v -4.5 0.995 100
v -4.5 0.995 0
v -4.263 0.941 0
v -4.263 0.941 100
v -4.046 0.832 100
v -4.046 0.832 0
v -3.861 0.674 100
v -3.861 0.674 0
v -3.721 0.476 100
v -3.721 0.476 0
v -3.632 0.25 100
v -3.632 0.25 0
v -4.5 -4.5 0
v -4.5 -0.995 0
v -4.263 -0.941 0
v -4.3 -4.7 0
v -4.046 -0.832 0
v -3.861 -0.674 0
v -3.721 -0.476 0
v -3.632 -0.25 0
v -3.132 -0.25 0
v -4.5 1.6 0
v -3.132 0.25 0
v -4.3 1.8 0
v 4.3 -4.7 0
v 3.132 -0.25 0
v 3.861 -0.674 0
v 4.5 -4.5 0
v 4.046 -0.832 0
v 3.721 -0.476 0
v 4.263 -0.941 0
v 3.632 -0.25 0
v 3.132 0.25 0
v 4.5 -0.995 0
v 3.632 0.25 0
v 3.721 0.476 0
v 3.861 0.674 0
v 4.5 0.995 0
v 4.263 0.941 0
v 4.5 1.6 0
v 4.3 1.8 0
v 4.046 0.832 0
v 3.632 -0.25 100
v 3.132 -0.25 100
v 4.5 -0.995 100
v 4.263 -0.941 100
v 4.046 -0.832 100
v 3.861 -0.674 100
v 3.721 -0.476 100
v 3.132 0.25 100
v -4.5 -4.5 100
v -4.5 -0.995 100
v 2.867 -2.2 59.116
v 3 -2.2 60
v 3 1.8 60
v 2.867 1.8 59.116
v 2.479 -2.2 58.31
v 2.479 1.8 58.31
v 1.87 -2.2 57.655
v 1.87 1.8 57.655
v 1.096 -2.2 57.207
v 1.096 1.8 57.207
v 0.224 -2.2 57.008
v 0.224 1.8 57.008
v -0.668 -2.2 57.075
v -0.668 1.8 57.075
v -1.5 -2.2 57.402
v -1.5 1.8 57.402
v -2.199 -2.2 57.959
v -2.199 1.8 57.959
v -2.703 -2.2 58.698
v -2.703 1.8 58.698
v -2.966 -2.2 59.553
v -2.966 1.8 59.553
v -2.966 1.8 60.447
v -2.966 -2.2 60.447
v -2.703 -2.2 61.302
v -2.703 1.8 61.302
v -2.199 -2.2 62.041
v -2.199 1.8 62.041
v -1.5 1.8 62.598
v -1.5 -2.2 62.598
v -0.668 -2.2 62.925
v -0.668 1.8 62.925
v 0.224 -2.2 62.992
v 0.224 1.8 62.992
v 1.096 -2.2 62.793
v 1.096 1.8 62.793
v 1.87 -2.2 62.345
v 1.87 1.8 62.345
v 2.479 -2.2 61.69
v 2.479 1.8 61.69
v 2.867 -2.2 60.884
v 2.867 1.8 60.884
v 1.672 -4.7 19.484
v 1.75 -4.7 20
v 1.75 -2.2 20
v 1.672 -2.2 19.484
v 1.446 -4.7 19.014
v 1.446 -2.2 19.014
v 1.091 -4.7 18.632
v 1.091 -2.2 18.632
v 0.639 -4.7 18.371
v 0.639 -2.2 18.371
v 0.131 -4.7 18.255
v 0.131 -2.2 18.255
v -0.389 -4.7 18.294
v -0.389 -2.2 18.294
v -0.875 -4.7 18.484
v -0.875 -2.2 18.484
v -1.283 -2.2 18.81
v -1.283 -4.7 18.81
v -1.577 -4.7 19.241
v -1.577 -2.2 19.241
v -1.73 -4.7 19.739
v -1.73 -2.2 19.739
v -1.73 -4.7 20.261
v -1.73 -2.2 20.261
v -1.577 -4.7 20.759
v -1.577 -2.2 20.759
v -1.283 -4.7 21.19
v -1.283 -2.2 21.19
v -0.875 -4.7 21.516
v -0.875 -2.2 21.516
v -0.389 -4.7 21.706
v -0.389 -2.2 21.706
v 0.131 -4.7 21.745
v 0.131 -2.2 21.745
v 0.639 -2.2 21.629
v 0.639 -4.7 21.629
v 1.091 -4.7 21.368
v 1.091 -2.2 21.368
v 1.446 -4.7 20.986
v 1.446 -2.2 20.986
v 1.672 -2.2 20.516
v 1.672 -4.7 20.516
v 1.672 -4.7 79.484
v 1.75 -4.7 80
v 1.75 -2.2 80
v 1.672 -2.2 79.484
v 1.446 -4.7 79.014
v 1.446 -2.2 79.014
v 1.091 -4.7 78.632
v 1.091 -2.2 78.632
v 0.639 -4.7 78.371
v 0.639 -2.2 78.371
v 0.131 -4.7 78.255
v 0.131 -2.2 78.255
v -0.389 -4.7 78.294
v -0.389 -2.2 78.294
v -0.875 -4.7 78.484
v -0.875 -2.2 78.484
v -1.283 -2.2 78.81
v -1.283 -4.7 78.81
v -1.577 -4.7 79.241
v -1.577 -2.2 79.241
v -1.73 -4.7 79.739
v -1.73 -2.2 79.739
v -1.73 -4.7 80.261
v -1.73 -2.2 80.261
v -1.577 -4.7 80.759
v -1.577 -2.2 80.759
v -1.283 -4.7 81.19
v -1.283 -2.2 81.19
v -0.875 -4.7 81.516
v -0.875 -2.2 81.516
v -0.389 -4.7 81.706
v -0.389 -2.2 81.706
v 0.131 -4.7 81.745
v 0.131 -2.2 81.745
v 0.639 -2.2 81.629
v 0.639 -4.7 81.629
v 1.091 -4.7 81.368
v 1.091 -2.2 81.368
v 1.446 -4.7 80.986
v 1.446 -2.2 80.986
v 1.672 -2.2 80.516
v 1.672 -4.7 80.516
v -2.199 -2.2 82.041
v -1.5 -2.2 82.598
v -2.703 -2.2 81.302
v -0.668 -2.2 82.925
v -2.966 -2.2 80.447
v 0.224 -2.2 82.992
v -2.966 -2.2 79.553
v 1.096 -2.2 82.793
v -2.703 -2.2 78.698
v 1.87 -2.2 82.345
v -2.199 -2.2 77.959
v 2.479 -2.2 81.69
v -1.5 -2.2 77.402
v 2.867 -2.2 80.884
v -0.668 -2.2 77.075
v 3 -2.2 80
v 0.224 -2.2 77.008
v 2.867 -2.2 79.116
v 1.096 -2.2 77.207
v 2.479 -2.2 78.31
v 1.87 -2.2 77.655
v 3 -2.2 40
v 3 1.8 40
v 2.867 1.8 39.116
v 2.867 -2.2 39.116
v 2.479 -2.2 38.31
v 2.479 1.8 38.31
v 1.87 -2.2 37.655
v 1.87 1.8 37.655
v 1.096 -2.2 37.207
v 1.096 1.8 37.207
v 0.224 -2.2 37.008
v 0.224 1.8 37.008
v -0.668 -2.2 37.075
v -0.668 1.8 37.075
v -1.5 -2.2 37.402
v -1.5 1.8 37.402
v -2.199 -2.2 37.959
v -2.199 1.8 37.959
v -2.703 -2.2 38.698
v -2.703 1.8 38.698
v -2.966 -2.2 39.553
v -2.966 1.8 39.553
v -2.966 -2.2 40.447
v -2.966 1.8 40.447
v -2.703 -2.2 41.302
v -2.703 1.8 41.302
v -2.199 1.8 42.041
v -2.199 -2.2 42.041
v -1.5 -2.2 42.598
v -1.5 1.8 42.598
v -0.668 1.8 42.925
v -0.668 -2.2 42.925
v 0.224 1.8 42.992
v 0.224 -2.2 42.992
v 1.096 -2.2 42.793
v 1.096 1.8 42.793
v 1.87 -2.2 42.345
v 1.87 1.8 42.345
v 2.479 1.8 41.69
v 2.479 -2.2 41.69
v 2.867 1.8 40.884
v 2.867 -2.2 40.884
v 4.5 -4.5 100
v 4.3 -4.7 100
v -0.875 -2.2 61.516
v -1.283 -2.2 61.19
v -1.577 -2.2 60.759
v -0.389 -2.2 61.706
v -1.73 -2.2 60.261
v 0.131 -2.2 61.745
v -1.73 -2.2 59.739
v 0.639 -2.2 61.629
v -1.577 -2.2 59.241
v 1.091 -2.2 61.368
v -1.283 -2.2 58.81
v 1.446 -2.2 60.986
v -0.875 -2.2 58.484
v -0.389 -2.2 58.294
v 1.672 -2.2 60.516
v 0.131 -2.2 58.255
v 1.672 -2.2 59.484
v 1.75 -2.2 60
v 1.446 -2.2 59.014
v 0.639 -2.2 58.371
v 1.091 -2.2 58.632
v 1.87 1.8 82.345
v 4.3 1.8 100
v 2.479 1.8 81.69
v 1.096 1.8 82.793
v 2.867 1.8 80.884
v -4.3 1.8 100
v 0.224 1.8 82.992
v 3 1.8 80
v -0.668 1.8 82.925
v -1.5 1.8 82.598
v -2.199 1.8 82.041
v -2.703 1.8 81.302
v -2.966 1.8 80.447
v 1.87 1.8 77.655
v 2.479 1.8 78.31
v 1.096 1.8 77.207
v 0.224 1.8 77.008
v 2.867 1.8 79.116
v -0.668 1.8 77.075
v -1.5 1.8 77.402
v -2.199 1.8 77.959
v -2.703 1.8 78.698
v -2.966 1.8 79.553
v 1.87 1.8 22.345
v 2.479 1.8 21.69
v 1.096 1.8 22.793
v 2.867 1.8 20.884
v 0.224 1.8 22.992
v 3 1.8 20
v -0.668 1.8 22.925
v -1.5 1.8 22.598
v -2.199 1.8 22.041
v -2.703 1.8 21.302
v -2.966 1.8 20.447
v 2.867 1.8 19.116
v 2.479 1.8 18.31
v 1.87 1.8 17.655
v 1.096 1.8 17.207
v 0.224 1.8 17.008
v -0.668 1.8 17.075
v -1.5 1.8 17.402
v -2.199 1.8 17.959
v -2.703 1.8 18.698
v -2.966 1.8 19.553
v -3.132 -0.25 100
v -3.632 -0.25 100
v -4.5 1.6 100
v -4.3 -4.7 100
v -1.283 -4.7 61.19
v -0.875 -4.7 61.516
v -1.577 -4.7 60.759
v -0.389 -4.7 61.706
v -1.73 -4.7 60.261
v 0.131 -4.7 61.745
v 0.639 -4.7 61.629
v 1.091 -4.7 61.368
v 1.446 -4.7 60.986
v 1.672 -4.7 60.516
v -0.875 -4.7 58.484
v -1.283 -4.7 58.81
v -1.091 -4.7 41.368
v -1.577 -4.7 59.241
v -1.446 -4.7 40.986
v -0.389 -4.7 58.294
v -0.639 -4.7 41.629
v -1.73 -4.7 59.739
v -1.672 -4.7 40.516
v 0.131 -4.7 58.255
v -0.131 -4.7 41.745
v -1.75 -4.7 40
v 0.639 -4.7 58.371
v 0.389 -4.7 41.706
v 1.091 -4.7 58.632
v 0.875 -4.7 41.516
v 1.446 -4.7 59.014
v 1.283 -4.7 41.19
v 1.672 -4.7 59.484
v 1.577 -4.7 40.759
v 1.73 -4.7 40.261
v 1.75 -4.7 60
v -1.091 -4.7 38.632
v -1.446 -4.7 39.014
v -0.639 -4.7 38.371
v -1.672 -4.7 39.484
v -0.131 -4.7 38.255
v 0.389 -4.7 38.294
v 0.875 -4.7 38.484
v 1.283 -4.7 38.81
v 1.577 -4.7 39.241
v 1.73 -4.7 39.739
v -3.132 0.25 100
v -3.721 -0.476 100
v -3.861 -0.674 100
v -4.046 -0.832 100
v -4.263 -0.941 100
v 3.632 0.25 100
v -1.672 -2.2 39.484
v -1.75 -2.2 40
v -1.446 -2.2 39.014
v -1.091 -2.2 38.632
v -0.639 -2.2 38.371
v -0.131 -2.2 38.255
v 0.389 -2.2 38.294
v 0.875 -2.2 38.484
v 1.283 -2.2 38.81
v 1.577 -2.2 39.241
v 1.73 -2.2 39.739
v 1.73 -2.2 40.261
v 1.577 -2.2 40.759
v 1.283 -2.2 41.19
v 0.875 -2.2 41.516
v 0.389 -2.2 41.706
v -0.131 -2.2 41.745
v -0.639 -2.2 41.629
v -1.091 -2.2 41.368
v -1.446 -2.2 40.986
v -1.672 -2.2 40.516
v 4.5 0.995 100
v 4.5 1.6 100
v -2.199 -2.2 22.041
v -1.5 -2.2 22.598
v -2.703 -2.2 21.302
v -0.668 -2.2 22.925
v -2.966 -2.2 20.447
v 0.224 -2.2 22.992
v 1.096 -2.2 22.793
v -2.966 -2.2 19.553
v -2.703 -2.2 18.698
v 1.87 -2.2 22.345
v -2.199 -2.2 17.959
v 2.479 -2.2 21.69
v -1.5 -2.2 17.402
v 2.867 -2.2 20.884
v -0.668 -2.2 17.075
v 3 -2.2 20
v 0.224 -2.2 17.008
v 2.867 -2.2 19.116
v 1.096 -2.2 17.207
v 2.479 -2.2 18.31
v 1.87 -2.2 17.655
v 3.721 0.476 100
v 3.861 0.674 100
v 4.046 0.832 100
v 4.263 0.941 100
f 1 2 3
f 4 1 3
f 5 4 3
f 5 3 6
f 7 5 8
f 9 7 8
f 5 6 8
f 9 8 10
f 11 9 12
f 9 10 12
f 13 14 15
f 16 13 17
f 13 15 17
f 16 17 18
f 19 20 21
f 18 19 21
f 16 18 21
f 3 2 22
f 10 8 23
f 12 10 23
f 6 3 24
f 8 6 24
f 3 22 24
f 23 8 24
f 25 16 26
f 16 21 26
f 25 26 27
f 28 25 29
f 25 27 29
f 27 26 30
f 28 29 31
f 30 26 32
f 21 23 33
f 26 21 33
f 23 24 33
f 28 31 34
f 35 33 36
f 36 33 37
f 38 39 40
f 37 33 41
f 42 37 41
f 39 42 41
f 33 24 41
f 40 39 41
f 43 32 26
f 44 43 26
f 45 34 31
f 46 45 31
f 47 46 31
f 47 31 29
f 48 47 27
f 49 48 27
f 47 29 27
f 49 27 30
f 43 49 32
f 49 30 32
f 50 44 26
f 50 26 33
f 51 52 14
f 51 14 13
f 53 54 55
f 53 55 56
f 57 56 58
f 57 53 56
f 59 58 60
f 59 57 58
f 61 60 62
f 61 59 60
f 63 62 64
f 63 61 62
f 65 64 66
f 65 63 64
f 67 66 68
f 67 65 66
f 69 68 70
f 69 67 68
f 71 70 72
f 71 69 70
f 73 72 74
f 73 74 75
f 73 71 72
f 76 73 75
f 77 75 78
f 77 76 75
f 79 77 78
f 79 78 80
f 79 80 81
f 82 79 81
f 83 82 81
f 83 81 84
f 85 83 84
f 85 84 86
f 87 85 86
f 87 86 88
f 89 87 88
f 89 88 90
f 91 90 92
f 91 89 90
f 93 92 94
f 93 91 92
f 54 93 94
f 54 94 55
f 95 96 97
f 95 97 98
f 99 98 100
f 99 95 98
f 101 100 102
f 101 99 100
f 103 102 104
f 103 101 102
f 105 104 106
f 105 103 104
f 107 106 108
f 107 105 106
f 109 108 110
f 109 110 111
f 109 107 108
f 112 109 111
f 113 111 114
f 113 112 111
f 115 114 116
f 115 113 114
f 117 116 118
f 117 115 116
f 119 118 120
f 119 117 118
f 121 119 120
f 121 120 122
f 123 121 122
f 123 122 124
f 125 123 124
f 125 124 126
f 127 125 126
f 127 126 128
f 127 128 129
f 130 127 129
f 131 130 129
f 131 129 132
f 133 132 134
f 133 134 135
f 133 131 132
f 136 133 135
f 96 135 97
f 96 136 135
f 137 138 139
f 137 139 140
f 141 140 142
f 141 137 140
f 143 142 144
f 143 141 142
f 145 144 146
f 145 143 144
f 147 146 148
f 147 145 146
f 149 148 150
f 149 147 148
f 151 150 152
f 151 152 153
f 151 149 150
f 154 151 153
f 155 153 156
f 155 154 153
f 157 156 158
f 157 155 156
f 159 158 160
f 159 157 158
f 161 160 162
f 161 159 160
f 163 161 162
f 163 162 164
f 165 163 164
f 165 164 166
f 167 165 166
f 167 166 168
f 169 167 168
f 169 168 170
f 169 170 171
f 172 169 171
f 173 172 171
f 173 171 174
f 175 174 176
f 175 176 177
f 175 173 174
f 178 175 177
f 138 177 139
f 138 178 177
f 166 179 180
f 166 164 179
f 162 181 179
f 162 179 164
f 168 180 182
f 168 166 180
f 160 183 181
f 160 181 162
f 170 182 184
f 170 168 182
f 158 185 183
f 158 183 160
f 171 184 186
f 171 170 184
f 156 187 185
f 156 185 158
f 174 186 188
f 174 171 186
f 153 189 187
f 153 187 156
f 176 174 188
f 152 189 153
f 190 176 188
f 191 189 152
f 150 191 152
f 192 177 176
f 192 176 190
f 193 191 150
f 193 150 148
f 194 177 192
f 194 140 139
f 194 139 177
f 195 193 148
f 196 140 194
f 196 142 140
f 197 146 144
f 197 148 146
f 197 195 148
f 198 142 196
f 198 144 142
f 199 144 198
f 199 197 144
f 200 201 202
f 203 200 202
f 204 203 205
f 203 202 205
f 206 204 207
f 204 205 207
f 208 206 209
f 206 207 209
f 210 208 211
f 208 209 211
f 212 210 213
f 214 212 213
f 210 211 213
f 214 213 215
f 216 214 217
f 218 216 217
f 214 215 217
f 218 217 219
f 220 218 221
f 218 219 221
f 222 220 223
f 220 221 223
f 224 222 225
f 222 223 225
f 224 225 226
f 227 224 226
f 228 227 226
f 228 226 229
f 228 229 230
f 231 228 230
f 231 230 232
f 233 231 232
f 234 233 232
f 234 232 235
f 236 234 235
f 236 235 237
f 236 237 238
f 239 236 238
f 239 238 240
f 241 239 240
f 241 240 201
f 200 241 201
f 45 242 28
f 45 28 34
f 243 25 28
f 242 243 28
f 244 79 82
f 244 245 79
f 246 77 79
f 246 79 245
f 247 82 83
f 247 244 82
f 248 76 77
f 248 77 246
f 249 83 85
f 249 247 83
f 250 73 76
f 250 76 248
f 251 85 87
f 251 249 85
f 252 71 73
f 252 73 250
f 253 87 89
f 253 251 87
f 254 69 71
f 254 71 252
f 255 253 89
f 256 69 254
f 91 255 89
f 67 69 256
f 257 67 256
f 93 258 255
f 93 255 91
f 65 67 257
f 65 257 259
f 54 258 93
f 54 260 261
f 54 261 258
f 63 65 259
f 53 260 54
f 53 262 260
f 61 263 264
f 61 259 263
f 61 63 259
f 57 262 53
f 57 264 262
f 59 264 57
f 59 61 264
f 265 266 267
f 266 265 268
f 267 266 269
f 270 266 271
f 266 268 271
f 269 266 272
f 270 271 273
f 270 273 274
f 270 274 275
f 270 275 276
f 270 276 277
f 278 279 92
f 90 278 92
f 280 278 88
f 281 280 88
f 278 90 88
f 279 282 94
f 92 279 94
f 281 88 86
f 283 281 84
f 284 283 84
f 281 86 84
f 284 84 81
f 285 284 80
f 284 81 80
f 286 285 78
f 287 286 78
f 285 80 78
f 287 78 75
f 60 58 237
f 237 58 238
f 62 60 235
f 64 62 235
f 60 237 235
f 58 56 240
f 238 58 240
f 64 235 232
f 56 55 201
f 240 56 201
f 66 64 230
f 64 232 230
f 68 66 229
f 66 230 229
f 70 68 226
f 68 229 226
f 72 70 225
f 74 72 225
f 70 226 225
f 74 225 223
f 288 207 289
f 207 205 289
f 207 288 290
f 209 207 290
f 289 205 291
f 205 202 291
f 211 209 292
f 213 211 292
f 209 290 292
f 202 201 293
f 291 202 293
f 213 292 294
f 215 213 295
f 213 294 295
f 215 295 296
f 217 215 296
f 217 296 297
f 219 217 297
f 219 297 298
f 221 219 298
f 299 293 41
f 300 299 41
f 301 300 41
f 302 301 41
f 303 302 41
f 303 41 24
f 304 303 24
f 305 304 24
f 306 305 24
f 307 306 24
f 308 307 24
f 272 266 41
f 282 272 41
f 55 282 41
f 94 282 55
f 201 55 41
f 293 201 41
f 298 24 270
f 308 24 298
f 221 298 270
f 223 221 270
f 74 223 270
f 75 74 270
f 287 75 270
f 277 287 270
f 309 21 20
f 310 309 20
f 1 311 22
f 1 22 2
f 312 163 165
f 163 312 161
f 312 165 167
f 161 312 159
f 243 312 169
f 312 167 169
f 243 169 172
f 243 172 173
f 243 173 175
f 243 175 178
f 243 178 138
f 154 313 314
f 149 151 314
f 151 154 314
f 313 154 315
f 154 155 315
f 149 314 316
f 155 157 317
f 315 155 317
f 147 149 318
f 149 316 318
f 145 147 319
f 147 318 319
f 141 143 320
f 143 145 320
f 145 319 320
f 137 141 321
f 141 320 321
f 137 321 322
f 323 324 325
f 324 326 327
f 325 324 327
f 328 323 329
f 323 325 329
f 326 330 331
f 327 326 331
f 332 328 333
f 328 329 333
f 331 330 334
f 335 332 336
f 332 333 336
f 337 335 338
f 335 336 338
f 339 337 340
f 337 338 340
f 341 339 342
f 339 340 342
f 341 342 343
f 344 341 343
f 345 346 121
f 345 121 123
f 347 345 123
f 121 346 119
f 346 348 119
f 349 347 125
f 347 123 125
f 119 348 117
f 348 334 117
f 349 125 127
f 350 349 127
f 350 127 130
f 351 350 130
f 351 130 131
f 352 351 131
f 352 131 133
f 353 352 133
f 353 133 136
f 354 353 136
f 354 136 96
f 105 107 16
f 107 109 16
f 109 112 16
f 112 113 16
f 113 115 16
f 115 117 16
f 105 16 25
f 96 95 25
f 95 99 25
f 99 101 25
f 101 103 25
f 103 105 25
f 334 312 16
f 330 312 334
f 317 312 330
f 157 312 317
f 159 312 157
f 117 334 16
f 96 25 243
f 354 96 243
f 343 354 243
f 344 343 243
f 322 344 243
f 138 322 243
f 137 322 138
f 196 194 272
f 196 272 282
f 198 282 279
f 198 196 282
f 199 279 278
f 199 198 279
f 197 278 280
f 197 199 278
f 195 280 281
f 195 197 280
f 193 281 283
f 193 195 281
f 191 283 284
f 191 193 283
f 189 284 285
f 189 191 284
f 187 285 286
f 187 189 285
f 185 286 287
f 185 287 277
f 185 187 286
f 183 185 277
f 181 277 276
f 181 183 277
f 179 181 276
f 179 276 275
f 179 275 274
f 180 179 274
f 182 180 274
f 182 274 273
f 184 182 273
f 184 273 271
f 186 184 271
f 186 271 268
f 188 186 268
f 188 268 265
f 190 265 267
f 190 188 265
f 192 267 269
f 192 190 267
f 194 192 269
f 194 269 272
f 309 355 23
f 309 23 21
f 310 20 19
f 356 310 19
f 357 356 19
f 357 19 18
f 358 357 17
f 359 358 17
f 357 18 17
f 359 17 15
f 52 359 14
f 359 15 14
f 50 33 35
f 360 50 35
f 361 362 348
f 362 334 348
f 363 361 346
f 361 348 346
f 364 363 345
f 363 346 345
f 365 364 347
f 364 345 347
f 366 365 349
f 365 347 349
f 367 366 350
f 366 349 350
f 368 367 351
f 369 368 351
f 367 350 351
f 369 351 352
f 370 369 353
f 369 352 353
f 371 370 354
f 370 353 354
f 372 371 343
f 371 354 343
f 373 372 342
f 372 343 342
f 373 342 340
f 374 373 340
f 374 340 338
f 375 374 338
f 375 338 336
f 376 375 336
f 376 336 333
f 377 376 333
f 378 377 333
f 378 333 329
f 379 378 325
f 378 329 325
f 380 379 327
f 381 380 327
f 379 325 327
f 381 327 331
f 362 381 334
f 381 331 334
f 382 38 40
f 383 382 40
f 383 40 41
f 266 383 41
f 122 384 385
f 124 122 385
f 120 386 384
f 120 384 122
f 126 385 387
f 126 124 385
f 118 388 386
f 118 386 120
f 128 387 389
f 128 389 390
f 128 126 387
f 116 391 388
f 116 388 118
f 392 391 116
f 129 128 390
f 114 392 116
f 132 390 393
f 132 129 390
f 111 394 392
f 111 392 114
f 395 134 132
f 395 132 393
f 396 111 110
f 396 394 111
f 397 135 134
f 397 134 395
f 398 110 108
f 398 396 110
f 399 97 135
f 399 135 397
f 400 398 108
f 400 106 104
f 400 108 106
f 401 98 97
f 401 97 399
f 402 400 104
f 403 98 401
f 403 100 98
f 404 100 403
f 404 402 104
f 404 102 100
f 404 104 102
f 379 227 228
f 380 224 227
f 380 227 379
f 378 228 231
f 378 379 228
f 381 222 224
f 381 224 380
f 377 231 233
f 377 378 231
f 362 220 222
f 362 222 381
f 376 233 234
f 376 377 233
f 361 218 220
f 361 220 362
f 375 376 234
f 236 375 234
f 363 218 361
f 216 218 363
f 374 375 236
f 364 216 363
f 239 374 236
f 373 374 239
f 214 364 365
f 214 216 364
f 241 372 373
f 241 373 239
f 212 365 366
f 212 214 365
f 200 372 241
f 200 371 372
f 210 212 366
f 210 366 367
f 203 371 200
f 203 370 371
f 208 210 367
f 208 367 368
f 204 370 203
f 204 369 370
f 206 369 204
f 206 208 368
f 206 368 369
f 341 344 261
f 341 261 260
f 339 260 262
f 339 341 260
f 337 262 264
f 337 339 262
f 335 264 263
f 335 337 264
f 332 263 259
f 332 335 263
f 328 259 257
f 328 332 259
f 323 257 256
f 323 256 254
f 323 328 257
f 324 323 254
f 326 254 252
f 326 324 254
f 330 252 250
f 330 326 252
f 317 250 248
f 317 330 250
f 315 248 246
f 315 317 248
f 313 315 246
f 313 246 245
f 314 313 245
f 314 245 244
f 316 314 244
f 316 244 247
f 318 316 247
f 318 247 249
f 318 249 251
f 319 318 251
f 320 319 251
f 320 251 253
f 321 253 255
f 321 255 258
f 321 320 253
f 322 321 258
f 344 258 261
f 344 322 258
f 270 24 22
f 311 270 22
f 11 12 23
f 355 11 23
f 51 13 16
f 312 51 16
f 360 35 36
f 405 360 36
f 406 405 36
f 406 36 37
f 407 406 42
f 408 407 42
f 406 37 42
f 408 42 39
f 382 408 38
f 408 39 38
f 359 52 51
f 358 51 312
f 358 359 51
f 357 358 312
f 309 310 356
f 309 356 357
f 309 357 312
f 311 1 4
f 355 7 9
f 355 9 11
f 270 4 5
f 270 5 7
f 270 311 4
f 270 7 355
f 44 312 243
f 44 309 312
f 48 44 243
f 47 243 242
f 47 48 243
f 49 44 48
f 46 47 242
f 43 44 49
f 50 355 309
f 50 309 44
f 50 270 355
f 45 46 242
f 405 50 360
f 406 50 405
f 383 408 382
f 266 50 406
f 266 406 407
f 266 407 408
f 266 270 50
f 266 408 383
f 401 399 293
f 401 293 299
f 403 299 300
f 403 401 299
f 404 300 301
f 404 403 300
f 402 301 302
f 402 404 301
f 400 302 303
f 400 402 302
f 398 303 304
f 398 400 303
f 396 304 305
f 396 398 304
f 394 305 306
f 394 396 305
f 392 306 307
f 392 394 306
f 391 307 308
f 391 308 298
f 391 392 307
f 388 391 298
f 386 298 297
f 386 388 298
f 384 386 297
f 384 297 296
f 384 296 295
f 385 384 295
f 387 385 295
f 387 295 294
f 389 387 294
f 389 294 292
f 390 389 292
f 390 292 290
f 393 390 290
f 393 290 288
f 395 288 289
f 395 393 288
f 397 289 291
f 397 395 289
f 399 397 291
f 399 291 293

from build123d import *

# Parameters (mm, degrees)
EXTRUDE_RAIL_PROFILE_DEPTH     = 100
CBORE_FOR_M3_SHCS2_D           = 3.5
CBORE_FOR_M3_SHCS2_CBORE_D     = 6
CBORE_FOR_M3_SHCS2_CBORE_DEPTH = 4
FILL_START                     = -2.2
FILL_PATTERN_OUTLINE_R         = 3
FILL_PATTERN_DEPTH             = 4
FILL_START_2                   = -4.7
FILL_PATTERN_2_OUTLINE_R       = 1.75
FILL_PATTERN_2_DEPTH           = 2.5


# Read off the part's stored shape, not the designer's step: Fill Pattern
with BuildPart() as part:
    # Rail Profile Sketch → Extrude Rail Profile (new body)
    with BuildSketch(Plane.XY):
        with BuildLine():
            Line((-4.3, -4.7), (4.3, -4.7))
            Line((4.3, -4.7), (4.5, -4.5))
            Line((4.5, -4.5), (4.5, -0.994987437))
            ThreePointArc((4.5, -0.994987437), (3.948817336, -0.758921035), (3.631754163, -0.25))
            Line((3.631754163, -0.25), (3.131754163, -0.25))
            Line((3.131754163, -0.25), (3.131754163, 0.25))
            Line((3.131754163, 0.25), (3.631754163, 0.25))
            ThreePointArc((3.631754163, 0.25), (3.948817336, 0.758921035), (4.5, 0.994987437))
            Line((4.5, 0.994987437), (4.5, 1.6))
            Line((4.5, 1.6), (4.3, 1.8))
            Line((4.3, 1.8), (-4.3, 1.8))
            Line((-4.3, 1.8), (-4.5, 1.6))
            Line((-4.5, 1.6), (-4.5, 0.994987437))
            ThreePointArc((-4.5, 0.994987437), (-3.948817336, 0.758921035), (-3.631754163, 0.25))
            Line((-3.631754163, 0.25), (-3.131754163, 0.25))
            Line((-3.131754163, 0.25), (-3.131754163, -0.25))
            Line((-3.131754163, -0.25), (-3.631754163, -0.25))
            ThreePointArc((-3.631754163, -0.25), (-3.948817336, -0.758921035), (-4.5, -0.994987437))
            Line((-4.5, -0.994987437), (-4.5, -4.5))
            Line((-4.5, -4.5), (-4.3, -4.7))
        make_face()
    extrude(amount=EXTRUDE_RAIL_PROFILE_DEPTH)

    # CBORE for M3 SHCS2 (through all)
    with Locations(Plane(origin=(0, 1.8, 0), x_dir=(1, 0, 0), z_dir=(0, 1, 0))):
        with Locations((0, -40)):
            CounterBoreHole(CBORE_FOR_M3_SHCS2_D / 2, CBORE_FOR_M3_SHCS2_CBORE_D / 2, CBORE_FOR_M3_SHCS2_CBORE_DEPTH)

    # Fill Pattern outline → Fill Pattern (cut)
    with BuildSketch(Plane(origin=(0, 0, 0), x_dir=(1, 0, 0), z_dir=(0, 1, 0)).offset(FILL_START)):
        with Locations((0, -20)):
            Circle(FILL_PATTERN_OUTLINE_R)
        with Locations((0, -60)):
            Circle(FILL_PATTERN_OUTLINE_R)
        with Locations((0, -80)):
            Circle(FILL_PATTERN_OUTLINE_R)
    extrude(amount=FILL_PATTERN_DEPTH, mode=Mode.SUBTRACT)

    # Fill Pattern 2 outline → Fill Pattern 2 (cut)
    with BuildSketch(Plane(origin=(0, 0, 0), x_dir=(1, 0, 0), z_dir=(0, 1, 0)).offset(FILL_START_2)):
        with Locations((0, -20)):
            Circle(FILL_PATTERN_2_OUTLINE_R)
        with Locations((0, -60)):
            Circle(FILL_PATTERN_2_OUTLINE_R)
        with Locations((0, -80)):
            Circle(FILL_PATTERN_2_OUTLINE_R)
    extrude(amount=FILL_PATTERN_2_DEPTH, mode=Mode.SUBTRACT)


solid = part.part
